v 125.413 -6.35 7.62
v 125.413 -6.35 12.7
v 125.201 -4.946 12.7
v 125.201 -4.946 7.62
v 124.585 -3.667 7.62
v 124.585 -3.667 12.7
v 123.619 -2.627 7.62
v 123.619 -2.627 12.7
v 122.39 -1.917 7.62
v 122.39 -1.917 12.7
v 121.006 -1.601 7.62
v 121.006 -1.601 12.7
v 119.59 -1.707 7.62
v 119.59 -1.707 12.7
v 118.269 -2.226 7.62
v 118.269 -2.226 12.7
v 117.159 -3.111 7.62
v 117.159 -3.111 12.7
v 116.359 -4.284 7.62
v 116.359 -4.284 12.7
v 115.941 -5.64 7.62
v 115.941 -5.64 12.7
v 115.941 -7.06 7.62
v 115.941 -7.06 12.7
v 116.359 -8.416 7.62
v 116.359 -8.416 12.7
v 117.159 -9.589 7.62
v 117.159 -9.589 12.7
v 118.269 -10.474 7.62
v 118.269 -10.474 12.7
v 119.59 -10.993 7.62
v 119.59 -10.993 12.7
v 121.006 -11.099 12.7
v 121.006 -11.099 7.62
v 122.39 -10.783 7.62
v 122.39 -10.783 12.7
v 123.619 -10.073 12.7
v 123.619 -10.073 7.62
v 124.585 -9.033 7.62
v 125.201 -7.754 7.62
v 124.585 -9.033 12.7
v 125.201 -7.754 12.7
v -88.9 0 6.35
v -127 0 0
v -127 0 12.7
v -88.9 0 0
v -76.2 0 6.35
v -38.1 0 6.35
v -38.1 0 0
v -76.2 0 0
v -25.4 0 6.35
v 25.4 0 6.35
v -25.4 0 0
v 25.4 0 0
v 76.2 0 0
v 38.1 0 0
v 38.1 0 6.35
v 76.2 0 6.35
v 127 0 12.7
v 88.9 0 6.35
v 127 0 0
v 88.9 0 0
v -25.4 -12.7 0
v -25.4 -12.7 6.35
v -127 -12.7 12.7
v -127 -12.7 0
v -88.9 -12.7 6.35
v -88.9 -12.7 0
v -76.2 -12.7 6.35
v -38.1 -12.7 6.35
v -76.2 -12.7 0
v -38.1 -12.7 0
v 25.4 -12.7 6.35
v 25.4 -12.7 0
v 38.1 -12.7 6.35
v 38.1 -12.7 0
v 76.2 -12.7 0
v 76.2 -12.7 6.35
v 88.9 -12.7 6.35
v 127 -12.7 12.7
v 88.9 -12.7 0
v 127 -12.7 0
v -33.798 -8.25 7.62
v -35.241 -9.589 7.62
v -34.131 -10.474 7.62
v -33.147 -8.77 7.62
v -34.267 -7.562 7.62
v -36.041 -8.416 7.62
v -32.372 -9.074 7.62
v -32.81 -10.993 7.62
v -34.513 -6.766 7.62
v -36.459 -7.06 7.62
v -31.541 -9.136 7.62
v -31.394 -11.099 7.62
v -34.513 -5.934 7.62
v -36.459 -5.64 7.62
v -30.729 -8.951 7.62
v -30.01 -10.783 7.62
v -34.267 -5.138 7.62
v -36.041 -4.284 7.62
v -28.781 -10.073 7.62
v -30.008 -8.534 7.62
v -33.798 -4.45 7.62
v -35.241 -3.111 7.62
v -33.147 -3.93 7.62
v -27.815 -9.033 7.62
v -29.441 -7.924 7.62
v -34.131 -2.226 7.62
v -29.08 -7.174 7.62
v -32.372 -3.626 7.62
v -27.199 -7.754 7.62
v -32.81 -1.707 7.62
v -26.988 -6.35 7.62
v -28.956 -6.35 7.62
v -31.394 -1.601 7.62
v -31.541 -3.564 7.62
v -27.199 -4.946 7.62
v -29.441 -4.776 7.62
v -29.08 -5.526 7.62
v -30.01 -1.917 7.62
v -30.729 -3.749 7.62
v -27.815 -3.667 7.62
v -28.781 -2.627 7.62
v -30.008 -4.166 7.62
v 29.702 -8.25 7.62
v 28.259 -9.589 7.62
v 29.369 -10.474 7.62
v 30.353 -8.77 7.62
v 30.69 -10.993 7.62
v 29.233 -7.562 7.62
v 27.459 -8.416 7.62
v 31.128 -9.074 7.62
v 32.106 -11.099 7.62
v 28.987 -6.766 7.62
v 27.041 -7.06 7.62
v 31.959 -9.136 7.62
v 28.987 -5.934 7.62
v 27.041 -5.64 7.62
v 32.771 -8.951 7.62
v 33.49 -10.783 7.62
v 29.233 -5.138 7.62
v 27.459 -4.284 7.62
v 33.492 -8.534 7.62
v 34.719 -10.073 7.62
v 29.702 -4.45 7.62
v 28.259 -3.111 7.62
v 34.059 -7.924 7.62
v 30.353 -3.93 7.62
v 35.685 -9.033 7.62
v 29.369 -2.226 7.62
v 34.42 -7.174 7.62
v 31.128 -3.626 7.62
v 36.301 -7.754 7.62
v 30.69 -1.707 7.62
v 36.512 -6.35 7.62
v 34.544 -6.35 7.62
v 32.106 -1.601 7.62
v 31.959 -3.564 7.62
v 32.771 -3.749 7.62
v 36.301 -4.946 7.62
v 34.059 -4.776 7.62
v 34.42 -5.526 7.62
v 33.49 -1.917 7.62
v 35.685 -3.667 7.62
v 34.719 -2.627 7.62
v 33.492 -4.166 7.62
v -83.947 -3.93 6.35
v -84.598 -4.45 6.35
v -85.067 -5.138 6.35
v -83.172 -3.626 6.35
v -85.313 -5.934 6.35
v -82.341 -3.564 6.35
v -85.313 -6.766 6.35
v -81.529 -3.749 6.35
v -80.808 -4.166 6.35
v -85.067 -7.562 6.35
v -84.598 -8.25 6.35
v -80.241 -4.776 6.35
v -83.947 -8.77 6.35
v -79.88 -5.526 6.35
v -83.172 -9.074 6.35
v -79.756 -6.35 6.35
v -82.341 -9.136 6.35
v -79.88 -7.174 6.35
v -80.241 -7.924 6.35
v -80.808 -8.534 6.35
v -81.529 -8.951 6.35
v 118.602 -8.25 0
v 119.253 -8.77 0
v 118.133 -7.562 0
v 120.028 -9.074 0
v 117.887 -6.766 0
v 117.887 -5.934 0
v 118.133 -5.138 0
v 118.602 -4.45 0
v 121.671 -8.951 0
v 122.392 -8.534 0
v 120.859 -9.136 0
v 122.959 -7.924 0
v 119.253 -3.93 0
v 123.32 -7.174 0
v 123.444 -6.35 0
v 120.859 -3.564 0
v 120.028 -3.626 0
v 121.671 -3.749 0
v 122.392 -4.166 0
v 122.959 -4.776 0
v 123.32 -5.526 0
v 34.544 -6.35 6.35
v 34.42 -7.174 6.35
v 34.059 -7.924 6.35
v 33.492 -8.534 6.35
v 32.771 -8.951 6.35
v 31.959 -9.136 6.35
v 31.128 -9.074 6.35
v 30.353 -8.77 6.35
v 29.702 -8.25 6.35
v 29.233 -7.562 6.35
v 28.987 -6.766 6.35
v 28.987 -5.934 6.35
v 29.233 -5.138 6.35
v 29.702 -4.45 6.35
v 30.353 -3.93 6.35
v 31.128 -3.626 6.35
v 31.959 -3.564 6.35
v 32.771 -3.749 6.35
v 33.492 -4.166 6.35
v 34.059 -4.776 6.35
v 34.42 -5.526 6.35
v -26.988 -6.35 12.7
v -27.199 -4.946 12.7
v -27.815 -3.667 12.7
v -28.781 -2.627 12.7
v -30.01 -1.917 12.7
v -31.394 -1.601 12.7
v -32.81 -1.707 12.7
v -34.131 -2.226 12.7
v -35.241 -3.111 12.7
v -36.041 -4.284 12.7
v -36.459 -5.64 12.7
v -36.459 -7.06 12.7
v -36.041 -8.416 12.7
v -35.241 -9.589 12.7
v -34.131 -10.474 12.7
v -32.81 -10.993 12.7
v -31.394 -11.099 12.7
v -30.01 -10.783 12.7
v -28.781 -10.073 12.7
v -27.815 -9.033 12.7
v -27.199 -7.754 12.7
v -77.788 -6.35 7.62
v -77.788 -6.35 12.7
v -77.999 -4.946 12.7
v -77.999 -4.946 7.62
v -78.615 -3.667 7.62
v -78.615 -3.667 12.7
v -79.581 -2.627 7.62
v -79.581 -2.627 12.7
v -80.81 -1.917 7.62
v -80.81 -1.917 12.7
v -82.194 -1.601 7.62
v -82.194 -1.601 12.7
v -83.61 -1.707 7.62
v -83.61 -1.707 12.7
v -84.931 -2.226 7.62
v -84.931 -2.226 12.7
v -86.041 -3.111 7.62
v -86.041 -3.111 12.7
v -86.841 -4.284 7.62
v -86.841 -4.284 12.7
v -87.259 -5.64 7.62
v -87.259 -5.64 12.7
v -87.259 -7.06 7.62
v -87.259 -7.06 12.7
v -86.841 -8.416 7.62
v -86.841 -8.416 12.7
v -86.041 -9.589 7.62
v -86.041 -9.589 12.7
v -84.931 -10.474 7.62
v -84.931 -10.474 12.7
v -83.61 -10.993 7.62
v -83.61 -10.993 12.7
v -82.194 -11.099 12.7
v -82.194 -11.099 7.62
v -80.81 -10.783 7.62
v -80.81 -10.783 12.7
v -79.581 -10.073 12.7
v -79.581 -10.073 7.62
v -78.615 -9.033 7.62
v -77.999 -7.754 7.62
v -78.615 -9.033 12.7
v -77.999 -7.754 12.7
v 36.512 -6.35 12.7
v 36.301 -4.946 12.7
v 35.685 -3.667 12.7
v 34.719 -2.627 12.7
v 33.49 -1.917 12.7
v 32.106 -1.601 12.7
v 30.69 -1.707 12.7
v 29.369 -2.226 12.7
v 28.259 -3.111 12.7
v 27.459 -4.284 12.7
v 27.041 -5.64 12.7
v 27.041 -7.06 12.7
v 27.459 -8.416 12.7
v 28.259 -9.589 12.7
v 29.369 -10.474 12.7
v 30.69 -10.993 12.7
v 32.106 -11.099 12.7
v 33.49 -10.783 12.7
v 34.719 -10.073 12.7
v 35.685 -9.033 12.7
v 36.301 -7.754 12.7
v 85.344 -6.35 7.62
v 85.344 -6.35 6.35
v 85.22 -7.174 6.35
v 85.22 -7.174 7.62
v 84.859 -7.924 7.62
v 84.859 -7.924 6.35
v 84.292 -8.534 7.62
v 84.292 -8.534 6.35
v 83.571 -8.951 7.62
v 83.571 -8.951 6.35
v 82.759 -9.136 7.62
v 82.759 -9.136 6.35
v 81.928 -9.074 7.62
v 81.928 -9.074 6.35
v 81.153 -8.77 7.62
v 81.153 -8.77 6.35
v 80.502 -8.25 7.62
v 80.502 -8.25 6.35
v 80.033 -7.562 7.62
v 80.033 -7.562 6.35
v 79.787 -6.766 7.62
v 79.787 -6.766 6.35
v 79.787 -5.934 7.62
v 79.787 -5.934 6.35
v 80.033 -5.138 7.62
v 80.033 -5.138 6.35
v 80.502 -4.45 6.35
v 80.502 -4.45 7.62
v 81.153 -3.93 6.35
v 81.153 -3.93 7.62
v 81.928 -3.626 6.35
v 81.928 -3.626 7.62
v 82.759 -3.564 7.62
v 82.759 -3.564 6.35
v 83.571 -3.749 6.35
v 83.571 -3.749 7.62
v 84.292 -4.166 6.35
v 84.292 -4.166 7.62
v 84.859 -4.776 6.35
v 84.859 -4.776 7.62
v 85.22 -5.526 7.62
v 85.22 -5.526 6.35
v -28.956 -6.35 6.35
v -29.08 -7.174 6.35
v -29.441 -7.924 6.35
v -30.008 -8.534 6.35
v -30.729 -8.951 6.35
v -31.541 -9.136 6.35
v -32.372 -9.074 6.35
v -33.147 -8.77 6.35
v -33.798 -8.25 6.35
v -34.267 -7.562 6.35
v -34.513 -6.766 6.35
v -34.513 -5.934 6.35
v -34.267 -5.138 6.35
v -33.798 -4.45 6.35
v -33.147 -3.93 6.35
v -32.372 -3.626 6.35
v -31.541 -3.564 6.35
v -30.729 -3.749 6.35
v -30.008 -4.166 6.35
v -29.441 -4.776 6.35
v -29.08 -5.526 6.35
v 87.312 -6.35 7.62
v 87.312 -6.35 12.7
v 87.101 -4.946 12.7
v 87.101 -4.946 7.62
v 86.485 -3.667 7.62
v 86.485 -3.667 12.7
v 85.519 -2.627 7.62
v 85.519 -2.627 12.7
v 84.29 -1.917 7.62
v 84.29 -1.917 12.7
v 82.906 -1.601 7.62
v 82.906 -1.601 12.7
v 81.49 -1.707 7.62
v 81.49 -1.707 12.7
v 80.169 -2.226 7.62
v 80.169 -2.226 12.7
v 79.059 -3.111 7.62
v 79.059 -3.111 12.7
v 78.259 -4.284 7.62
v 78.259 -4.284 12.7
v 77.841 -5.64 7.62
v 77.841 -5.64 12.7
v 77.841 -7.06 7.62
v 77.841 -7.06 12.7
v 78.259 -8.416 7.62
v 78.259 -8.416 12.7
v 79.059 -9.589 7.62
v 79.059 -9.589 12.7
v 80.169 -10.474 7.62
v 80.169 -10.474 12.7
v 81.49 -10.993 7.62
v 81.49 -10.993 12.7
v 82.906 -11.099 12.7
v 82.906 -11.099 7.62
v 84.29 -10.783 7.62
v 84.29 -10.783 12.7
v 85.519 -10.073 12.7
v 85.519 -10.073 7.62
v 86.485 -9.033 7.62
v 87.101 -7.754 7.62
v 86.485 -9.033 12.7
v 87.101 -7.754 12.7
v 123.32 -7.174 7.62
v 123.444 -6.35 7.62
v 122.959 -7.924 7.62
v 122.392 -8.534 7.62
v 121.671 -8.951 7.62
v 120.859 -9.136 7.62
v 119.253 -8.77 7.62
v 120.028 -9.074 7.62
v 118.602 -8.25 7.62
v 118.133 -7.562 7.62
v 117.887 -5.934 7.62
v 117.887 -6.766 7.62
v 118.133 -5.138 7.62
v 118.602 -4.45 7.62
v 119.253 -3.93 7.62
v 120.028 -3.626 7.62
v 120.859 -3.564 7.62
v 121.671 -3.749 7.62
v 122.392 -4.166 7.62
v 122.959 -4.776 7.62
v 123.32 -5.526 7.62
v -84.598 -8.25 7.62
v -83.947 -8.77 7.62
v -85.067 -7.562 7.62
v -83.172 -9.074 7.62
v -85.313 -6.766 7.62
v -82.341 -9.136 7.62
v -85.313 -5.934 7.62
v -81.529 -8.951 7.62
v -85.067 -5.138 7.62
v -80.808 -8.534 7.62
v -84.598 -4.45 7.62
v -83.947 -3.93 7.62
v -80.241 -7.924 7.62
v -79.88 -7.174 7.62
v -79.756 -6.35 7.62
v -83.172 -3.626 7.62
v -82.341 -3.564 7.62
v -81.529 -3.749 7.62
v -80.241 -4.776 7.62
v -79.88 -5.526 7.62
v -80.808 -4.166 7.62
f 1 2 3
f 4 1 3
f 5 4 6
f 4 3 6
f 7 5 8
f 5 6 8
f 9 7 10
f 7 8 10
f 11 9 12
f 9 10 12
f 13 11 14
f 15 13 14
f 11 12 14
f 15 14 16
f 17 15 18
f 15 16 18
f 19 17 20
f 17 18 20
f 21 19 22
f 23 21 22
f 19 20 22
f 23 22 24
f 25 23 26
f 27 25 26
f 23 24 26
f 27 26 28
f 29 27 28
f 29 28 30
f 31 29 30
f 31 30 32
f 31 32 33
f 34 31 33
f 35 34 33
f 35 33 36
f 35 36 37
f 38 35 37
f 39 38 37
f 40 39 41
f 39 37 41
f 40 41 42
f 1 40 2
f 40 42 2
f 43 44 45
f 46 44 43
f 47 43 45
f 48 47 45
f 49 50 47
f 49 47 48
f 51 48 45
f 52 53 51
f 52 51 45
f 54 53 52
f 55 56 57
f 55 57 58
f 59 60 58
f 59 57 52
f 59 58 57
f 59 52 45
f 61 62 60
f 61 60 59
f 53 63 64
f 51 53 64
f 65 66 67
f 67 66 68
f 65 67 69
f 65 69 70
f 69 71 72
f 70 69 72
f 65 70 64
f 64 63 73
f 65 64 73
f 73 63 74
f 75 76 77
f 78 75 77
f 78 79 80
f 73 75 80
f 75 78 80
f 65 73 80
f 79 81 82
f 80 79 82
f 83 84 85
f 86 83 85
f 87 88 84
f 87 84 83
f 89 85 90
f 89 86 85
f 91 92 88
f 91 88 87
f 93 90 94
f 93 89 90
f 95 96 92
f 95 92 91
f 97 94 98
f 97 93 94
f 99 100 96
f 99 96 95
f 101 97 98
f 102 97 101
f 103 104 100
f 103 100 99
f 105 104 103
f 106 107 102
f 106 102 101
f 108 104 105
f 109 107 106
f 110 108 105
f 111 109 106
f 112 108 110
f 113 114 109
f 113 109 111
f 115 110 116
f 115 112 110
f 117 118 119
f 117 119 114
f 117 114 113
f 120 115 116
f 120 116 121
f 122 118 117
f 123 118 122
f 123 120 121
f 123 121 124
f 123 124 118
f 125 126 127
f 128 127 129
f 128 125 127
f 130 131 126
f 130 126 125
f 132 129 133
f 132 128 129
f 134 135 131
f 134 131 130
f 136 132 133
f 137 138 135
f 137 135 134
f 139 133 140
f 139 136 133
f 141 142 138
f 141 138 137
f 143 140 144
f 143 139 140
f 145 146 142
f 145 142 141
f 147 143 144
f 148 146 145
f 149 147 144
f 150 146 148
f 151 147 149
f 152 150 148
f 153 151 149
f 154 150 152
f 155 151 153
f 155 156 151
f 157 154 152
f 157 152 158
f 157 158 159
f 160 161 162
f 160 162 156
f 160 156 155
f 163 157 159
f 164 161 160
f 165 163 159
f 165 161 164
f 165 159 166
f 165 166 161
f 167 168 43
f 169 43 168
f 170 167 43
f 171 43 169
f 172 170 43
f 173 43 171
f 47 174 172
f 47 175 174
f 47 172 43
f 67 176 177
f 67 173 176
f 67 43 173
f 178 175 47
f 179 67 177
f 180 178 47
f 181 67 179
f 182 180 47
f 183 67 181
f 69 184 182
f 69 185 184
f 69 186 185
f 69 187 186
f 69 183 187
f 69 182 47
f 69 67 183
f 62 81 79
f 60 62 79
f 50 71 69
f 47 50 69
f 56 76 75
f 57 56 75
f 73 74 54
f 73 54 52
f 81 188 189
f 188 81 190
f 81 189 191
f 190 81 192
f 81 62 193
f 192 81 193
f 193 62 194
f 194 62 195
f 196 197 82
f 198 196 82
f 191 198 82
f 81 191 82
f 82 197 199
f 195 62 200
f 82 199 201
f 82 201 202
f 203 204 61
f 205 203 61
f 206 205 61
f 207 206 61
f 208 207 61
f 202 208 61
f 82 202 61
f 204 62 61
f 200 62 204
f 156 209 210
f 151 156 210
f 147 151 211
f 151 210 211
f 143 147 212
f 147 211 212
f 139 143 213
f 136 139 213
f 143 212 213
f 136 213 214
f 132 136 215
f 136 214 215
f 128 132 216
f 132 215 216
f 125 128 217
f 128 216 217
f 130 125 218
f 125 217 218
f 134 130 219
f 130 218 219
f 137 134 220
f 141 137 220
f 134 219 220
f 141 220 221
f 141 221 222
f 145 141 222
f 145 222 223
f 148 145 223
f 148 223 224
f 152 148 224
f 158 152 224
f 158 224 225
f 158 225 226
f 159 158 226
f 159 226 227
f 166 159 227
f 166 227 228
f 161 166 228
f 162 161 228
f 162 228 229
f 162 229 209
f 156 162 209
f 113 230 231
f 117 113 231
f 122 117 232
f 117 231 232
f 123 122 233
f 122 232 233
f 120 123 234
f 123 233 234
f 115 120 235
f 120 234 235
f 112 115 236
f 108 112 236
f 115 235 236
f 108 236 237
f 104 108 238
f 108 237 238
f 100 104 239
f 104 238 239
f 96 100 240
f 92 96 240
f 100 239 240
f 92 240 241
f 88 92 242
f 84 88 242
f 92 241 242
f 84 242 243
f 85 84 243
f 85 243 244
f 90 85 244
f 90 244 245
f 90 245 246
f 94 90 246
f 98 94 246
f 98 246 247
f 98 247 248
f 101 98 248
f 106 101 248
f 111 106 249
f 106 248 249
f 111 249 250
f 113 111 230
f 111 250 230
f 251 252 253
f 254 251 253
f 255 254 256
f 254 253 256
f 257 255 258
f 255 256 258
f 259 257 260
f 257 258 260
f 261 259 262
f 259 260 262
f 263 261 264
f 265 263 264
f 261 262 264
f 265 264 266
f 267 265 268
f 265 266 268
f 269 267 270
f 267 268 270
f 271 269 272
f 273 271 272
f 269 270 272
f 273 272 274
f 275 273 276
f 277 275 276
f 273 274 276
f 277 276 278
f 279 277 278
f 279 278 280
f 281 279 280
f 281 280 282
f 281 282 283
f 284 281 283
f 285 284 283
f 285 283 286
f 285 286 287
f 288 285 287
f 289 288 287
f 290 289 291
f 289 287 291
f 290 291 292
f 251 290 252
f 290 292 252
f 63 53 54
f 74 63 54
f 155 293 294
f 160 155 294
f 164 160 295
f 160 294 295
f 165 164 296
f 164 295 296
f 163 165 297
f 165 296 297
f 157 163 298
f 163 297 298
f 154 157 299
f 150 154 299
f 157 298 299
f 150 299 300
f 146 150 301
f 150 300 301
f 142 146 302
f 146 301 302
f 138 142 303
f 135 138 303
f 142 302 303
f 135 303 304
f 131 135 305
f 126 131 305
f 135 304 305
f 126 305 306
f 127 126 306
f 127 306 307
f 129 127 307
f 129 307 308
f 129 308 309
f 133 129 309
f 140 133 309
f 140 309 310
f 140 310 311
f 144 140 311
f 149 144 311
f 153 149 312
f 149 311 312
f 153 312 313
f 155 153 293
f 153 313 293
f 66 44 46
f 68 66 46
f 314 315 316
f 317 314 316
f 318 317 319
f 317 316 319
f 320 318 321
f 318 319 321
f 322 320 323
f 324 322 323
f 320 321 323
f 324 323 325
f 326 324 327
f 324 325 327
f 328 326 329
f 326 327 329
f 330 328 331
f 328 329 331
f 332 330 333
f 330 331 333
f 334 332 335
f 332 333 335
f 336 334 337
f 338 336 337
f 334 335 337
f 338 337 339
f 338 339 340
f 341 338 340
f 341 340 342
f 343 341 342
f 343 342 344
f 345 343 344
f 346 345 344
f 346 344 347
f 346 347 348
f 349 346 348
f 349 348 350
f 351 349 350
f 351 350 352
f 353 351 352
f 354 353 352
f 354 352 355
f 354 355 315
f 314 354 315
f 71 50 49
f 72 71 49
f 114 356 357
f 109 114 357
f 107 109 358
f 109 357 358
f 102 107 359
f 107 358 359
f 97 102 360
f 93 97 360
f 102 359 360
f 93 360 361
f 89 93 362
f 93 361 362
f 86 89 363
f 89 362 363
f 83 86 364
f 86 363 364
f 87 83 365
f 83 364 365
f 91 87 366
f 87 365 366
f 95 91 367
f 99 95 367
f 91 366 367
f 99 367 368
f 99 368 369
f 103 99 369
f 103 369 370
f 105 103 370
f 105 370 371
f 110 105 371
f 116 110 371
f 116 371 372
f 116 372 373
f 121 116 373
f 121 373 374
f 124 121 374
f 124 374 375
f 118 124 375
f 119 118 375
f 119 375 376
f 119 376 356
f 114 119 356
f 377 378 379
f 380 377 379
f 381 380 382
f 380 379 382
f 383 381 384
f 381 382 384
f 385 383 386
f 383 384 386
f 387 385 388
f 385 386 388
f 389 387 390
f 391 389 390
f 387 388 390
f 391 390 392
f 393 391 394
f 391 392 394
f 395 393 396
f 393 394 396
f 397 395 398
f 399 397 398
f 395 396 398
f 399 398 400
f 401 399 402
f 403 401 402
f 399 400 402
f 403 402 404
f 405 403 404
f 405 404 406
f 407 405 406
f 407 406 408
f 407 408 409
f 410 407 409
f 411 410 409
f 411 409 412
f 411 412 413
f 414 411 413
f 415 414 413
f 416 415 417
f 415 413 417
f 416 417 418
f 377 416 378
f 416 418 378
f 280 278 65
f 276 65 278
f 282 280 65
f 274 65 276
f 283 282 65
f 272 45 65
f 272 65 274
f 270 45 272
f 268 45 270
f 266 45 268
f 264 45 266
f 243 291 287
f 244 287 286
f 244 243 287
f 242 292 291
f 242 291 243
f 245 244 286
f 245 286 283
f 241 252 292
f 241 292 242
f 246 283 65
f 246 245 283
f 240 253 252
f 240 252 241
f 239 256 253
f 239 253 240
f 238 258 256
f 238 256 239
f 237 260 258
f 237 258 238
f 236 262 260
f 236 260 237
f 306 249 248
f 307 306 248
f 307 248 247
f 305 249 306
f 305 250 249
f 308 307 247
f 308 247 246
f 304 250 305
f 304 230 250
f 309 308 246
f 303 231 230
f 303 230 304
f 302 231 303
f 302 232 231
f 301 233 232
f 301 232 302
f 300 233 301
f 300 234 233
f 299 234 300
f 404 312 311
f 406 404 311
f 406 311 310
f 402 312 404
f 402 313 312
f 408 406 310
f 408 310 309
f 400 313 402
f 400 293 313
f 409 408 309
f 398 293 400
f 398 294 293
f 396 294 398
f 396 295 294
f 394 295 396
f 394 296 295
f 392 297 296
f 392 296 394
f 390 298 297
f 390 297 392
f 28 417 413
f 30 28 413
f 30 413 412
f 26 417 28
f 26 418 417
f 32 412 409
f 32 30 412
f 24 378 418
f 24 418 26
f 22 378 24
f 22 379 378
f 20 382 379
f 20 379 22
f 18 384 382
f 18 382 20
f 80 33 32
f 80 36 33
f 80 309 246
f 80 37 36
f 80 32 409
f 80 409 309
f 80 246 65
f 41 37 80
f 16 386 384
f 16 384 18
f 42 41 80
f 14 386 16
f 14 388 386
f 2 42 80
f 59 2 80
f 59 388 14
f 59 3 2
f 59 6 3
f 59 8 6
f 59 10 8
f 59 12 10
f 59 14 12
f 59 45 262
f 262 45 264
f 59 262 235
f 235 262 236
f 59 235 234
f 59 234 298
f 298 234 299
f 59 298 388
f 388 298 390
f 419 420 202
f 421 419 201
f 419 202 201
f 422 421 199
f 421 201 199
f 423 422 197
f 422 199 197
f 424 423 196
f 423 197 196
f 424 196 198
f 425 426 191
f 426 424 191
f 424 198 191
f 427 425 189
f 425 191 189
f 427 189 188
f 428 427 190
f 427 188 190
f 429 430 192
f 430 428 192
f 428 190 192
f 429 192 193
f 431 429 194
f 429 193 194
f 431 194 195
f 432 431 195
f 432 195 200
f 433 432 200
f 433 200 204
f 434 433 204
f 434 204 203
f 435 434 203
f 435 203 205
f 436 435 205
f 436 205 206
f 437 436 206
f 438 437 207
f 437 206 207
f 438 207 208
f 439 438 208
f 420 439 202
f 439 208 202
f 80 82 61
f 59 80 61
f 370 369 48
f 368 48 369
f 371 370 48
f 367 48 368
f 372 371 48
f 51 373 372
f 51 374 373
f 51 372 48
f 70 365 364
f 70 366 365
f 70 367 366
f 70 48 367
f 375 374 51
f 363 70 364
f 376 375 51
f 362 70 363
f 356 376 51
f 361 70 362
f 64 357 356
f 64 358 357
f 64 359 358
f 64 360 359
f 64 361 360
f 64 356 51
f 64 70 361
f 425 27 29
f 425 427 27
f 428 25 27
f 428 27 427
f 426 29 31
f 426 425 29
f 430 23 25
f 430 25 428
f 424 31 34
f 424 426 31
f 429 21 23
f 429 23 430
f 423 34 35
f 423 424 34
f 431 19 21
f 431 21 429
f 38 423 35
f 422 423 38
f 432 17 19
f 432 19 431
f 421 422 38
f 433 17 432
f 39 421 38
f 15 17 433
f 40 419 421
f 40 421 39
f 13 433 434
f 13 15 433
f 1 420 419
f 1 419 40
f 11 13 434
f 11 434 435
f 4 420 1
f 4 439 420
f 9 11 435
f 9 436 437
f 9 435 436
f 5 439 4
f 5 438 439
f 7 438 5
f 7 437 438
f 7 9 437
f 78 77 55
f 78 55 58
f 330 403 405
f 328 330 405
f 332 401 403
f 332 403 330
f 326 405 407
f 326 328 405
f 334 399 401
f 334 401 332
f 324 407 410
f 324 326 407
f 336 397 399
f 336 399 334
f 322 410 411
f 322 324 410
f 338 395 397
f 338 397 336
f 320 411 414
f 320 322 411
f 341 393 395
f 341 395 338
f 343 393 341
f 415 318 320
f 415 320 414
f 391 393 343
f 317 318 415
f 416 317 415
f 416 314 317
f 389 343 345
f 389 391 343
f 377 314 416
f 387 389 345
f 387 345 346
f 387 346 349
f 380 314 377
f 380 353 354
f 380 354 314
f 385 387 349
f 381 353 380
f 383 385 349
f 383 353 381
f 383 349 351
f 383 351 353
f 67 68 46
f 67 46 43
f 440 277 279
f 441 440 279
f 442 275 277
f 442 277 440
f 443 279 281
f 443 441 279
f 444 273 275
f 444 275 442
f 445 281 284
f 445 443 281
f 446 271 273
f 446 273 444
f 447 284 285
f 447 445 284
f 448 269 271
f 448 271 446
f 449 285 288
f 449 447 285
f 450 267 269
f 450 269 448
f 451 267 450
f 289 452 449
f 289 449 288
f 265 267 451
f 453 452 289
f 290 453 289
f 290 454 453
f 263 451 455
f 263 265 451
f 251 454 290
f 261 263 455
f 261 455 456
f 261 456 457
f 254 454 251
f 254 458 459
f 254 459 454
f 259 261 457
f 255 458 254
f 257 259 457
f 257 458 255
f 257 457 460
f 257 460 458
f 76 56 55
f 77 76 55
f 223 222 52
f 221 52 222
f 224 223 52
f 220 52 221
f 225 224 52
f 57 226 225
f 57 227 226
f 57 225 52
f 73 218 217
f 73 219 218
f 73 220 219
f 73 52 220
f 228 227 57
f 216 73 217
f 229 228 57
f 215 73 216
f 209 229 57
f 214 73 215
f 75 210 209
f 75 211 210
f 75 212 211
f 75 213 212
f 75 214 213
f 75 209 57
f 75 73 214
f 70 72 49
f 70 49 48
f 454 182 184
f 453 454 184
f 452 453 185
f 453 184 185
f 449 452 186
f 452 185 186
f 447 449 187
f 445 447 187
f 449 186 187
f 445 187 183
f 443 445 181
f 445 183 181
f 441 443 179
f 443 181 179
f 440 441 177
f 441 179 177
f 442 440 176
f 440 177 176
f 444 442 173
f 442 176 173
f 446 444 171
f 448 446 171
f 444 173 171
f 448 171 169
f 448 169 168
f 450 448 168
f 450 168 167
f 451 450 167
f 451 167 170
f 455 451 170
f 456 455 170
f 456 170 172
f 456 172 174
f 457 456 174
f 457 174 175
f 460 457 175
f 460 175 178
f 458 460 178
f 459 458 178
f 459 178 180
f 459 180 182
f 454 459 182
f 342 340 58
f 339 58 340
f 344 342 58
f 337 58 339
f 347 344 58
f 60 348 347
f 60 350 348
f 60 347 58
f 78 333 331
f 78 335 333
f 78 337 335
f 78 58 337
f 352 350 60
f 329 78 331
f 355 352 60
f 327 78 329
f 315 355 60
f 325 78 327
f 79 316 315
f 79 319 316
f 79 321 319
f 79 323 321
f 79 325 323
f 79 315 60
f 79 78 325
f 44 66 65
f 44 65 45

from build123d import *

# Parameters (mm, degrees)
F0_W      = 254
F0_H      = 12.7
F1_DEPTH  = 12.7
F2_W      = 12.7
F2_H      = 6.35
F3_DEPTH  = 12.701
F4_R      = 2.794
F5_DEPTH  = 6.351
F6_R      = 4.7625
F7_DEPTH  = 5.08
F8_R      = 2.794
F9_DEPTH  = 12.701
F10_R     = 4.7625
F10_R_2   = 2.794
F11_DEPTH = 5.08


with BuildPart() as f1:
    # F0 (on Top) → F1 (new body)
    with BuildSketch(Plane.XY):
        with Locations((0, -6.35)):
            Rectangle(F0_W, F0_H)
    extrude(amount=F1_DEPTH)

    # F2 (on face) → F3 (cut, through all)
    with BuildSketch(Plane.XZ.offset(12.7)):
        with Locations((82.55, 3.175)):
            Rectangle(F2_W, F2_H)
        with Locations((31.75, 3.175)):
            Rectangle(F2_W, F2_H)
        with Locations((-31.75, 3.175)):
            Rectangle(F2_W, F2_H)
        with Locations((-82.55, 3.175)):
            Rectangle(F2_W, F2_H)
    extrude(amount=-F3_DEPTH, mode=Mode.SUBTRACT)

    # F4 (on face) → F5 (cut, through all)
    with BuildSketch(Plane(origin=(0, 0, 6.35), x_dir=(1, 0, 0), z_dir=(0, 0, -1))):
        with Locations((82.55, 6.35)):
            Circle(F4_R)
        with Locations((31.75, 6.35)):
            Circle(F4_R)
        with Locations((-82.55, 6.35)):
            Circle(F4_R)
        with Locations((-31.75, 6.35)):
            Circle(F4_R)
    extrude(amount=-F5_DEPTH, mode=Mode.SUBTRACT)

    # F6 (on face) → F7 (cut)
    with BuildSketch(Plane.XY.offset(12.7)):
        with Locations((82.55, -6.35)):
            Circle(F6_R)
        with Locations((31.75, -6.35)):
            Circle(F6_R)
        with Locations((-82.55, -6.35)):
            Circle(F6_R)
        with Locations((-31.75, -6.35)):
            Circle(F6_R)
    extrude(amount=-F7_DEPTH, mode=Mode.SUBTRACT)

    # F8 (on face) → F9 (cut, through all)
    with BuildSketch(Plane(origin=(0, 0, 0), x_dir=(1, 0, 0), z_dir=(0, 0, -1))):
        with Locations((120.65, 6.35)):
            Circle(F8_R)
    extrude(amount=-F9_DEPTH, mode=Mode.SUBTRACT)

    # F10 (on face) → F11 (cut)
    with BuildSketch(Plane.XY.offset(12.7)):
        with Locations((120.65, -6.35)):
            Circle(F10_R)
        with Locations((120.65, -6.35)):
            Circle(F10_R_2, mode=Mode.SUBTRACT)
    extrude(amount=-F11_DEPTH, mode=Mode.SUBTRACT)


solid = f1.part
